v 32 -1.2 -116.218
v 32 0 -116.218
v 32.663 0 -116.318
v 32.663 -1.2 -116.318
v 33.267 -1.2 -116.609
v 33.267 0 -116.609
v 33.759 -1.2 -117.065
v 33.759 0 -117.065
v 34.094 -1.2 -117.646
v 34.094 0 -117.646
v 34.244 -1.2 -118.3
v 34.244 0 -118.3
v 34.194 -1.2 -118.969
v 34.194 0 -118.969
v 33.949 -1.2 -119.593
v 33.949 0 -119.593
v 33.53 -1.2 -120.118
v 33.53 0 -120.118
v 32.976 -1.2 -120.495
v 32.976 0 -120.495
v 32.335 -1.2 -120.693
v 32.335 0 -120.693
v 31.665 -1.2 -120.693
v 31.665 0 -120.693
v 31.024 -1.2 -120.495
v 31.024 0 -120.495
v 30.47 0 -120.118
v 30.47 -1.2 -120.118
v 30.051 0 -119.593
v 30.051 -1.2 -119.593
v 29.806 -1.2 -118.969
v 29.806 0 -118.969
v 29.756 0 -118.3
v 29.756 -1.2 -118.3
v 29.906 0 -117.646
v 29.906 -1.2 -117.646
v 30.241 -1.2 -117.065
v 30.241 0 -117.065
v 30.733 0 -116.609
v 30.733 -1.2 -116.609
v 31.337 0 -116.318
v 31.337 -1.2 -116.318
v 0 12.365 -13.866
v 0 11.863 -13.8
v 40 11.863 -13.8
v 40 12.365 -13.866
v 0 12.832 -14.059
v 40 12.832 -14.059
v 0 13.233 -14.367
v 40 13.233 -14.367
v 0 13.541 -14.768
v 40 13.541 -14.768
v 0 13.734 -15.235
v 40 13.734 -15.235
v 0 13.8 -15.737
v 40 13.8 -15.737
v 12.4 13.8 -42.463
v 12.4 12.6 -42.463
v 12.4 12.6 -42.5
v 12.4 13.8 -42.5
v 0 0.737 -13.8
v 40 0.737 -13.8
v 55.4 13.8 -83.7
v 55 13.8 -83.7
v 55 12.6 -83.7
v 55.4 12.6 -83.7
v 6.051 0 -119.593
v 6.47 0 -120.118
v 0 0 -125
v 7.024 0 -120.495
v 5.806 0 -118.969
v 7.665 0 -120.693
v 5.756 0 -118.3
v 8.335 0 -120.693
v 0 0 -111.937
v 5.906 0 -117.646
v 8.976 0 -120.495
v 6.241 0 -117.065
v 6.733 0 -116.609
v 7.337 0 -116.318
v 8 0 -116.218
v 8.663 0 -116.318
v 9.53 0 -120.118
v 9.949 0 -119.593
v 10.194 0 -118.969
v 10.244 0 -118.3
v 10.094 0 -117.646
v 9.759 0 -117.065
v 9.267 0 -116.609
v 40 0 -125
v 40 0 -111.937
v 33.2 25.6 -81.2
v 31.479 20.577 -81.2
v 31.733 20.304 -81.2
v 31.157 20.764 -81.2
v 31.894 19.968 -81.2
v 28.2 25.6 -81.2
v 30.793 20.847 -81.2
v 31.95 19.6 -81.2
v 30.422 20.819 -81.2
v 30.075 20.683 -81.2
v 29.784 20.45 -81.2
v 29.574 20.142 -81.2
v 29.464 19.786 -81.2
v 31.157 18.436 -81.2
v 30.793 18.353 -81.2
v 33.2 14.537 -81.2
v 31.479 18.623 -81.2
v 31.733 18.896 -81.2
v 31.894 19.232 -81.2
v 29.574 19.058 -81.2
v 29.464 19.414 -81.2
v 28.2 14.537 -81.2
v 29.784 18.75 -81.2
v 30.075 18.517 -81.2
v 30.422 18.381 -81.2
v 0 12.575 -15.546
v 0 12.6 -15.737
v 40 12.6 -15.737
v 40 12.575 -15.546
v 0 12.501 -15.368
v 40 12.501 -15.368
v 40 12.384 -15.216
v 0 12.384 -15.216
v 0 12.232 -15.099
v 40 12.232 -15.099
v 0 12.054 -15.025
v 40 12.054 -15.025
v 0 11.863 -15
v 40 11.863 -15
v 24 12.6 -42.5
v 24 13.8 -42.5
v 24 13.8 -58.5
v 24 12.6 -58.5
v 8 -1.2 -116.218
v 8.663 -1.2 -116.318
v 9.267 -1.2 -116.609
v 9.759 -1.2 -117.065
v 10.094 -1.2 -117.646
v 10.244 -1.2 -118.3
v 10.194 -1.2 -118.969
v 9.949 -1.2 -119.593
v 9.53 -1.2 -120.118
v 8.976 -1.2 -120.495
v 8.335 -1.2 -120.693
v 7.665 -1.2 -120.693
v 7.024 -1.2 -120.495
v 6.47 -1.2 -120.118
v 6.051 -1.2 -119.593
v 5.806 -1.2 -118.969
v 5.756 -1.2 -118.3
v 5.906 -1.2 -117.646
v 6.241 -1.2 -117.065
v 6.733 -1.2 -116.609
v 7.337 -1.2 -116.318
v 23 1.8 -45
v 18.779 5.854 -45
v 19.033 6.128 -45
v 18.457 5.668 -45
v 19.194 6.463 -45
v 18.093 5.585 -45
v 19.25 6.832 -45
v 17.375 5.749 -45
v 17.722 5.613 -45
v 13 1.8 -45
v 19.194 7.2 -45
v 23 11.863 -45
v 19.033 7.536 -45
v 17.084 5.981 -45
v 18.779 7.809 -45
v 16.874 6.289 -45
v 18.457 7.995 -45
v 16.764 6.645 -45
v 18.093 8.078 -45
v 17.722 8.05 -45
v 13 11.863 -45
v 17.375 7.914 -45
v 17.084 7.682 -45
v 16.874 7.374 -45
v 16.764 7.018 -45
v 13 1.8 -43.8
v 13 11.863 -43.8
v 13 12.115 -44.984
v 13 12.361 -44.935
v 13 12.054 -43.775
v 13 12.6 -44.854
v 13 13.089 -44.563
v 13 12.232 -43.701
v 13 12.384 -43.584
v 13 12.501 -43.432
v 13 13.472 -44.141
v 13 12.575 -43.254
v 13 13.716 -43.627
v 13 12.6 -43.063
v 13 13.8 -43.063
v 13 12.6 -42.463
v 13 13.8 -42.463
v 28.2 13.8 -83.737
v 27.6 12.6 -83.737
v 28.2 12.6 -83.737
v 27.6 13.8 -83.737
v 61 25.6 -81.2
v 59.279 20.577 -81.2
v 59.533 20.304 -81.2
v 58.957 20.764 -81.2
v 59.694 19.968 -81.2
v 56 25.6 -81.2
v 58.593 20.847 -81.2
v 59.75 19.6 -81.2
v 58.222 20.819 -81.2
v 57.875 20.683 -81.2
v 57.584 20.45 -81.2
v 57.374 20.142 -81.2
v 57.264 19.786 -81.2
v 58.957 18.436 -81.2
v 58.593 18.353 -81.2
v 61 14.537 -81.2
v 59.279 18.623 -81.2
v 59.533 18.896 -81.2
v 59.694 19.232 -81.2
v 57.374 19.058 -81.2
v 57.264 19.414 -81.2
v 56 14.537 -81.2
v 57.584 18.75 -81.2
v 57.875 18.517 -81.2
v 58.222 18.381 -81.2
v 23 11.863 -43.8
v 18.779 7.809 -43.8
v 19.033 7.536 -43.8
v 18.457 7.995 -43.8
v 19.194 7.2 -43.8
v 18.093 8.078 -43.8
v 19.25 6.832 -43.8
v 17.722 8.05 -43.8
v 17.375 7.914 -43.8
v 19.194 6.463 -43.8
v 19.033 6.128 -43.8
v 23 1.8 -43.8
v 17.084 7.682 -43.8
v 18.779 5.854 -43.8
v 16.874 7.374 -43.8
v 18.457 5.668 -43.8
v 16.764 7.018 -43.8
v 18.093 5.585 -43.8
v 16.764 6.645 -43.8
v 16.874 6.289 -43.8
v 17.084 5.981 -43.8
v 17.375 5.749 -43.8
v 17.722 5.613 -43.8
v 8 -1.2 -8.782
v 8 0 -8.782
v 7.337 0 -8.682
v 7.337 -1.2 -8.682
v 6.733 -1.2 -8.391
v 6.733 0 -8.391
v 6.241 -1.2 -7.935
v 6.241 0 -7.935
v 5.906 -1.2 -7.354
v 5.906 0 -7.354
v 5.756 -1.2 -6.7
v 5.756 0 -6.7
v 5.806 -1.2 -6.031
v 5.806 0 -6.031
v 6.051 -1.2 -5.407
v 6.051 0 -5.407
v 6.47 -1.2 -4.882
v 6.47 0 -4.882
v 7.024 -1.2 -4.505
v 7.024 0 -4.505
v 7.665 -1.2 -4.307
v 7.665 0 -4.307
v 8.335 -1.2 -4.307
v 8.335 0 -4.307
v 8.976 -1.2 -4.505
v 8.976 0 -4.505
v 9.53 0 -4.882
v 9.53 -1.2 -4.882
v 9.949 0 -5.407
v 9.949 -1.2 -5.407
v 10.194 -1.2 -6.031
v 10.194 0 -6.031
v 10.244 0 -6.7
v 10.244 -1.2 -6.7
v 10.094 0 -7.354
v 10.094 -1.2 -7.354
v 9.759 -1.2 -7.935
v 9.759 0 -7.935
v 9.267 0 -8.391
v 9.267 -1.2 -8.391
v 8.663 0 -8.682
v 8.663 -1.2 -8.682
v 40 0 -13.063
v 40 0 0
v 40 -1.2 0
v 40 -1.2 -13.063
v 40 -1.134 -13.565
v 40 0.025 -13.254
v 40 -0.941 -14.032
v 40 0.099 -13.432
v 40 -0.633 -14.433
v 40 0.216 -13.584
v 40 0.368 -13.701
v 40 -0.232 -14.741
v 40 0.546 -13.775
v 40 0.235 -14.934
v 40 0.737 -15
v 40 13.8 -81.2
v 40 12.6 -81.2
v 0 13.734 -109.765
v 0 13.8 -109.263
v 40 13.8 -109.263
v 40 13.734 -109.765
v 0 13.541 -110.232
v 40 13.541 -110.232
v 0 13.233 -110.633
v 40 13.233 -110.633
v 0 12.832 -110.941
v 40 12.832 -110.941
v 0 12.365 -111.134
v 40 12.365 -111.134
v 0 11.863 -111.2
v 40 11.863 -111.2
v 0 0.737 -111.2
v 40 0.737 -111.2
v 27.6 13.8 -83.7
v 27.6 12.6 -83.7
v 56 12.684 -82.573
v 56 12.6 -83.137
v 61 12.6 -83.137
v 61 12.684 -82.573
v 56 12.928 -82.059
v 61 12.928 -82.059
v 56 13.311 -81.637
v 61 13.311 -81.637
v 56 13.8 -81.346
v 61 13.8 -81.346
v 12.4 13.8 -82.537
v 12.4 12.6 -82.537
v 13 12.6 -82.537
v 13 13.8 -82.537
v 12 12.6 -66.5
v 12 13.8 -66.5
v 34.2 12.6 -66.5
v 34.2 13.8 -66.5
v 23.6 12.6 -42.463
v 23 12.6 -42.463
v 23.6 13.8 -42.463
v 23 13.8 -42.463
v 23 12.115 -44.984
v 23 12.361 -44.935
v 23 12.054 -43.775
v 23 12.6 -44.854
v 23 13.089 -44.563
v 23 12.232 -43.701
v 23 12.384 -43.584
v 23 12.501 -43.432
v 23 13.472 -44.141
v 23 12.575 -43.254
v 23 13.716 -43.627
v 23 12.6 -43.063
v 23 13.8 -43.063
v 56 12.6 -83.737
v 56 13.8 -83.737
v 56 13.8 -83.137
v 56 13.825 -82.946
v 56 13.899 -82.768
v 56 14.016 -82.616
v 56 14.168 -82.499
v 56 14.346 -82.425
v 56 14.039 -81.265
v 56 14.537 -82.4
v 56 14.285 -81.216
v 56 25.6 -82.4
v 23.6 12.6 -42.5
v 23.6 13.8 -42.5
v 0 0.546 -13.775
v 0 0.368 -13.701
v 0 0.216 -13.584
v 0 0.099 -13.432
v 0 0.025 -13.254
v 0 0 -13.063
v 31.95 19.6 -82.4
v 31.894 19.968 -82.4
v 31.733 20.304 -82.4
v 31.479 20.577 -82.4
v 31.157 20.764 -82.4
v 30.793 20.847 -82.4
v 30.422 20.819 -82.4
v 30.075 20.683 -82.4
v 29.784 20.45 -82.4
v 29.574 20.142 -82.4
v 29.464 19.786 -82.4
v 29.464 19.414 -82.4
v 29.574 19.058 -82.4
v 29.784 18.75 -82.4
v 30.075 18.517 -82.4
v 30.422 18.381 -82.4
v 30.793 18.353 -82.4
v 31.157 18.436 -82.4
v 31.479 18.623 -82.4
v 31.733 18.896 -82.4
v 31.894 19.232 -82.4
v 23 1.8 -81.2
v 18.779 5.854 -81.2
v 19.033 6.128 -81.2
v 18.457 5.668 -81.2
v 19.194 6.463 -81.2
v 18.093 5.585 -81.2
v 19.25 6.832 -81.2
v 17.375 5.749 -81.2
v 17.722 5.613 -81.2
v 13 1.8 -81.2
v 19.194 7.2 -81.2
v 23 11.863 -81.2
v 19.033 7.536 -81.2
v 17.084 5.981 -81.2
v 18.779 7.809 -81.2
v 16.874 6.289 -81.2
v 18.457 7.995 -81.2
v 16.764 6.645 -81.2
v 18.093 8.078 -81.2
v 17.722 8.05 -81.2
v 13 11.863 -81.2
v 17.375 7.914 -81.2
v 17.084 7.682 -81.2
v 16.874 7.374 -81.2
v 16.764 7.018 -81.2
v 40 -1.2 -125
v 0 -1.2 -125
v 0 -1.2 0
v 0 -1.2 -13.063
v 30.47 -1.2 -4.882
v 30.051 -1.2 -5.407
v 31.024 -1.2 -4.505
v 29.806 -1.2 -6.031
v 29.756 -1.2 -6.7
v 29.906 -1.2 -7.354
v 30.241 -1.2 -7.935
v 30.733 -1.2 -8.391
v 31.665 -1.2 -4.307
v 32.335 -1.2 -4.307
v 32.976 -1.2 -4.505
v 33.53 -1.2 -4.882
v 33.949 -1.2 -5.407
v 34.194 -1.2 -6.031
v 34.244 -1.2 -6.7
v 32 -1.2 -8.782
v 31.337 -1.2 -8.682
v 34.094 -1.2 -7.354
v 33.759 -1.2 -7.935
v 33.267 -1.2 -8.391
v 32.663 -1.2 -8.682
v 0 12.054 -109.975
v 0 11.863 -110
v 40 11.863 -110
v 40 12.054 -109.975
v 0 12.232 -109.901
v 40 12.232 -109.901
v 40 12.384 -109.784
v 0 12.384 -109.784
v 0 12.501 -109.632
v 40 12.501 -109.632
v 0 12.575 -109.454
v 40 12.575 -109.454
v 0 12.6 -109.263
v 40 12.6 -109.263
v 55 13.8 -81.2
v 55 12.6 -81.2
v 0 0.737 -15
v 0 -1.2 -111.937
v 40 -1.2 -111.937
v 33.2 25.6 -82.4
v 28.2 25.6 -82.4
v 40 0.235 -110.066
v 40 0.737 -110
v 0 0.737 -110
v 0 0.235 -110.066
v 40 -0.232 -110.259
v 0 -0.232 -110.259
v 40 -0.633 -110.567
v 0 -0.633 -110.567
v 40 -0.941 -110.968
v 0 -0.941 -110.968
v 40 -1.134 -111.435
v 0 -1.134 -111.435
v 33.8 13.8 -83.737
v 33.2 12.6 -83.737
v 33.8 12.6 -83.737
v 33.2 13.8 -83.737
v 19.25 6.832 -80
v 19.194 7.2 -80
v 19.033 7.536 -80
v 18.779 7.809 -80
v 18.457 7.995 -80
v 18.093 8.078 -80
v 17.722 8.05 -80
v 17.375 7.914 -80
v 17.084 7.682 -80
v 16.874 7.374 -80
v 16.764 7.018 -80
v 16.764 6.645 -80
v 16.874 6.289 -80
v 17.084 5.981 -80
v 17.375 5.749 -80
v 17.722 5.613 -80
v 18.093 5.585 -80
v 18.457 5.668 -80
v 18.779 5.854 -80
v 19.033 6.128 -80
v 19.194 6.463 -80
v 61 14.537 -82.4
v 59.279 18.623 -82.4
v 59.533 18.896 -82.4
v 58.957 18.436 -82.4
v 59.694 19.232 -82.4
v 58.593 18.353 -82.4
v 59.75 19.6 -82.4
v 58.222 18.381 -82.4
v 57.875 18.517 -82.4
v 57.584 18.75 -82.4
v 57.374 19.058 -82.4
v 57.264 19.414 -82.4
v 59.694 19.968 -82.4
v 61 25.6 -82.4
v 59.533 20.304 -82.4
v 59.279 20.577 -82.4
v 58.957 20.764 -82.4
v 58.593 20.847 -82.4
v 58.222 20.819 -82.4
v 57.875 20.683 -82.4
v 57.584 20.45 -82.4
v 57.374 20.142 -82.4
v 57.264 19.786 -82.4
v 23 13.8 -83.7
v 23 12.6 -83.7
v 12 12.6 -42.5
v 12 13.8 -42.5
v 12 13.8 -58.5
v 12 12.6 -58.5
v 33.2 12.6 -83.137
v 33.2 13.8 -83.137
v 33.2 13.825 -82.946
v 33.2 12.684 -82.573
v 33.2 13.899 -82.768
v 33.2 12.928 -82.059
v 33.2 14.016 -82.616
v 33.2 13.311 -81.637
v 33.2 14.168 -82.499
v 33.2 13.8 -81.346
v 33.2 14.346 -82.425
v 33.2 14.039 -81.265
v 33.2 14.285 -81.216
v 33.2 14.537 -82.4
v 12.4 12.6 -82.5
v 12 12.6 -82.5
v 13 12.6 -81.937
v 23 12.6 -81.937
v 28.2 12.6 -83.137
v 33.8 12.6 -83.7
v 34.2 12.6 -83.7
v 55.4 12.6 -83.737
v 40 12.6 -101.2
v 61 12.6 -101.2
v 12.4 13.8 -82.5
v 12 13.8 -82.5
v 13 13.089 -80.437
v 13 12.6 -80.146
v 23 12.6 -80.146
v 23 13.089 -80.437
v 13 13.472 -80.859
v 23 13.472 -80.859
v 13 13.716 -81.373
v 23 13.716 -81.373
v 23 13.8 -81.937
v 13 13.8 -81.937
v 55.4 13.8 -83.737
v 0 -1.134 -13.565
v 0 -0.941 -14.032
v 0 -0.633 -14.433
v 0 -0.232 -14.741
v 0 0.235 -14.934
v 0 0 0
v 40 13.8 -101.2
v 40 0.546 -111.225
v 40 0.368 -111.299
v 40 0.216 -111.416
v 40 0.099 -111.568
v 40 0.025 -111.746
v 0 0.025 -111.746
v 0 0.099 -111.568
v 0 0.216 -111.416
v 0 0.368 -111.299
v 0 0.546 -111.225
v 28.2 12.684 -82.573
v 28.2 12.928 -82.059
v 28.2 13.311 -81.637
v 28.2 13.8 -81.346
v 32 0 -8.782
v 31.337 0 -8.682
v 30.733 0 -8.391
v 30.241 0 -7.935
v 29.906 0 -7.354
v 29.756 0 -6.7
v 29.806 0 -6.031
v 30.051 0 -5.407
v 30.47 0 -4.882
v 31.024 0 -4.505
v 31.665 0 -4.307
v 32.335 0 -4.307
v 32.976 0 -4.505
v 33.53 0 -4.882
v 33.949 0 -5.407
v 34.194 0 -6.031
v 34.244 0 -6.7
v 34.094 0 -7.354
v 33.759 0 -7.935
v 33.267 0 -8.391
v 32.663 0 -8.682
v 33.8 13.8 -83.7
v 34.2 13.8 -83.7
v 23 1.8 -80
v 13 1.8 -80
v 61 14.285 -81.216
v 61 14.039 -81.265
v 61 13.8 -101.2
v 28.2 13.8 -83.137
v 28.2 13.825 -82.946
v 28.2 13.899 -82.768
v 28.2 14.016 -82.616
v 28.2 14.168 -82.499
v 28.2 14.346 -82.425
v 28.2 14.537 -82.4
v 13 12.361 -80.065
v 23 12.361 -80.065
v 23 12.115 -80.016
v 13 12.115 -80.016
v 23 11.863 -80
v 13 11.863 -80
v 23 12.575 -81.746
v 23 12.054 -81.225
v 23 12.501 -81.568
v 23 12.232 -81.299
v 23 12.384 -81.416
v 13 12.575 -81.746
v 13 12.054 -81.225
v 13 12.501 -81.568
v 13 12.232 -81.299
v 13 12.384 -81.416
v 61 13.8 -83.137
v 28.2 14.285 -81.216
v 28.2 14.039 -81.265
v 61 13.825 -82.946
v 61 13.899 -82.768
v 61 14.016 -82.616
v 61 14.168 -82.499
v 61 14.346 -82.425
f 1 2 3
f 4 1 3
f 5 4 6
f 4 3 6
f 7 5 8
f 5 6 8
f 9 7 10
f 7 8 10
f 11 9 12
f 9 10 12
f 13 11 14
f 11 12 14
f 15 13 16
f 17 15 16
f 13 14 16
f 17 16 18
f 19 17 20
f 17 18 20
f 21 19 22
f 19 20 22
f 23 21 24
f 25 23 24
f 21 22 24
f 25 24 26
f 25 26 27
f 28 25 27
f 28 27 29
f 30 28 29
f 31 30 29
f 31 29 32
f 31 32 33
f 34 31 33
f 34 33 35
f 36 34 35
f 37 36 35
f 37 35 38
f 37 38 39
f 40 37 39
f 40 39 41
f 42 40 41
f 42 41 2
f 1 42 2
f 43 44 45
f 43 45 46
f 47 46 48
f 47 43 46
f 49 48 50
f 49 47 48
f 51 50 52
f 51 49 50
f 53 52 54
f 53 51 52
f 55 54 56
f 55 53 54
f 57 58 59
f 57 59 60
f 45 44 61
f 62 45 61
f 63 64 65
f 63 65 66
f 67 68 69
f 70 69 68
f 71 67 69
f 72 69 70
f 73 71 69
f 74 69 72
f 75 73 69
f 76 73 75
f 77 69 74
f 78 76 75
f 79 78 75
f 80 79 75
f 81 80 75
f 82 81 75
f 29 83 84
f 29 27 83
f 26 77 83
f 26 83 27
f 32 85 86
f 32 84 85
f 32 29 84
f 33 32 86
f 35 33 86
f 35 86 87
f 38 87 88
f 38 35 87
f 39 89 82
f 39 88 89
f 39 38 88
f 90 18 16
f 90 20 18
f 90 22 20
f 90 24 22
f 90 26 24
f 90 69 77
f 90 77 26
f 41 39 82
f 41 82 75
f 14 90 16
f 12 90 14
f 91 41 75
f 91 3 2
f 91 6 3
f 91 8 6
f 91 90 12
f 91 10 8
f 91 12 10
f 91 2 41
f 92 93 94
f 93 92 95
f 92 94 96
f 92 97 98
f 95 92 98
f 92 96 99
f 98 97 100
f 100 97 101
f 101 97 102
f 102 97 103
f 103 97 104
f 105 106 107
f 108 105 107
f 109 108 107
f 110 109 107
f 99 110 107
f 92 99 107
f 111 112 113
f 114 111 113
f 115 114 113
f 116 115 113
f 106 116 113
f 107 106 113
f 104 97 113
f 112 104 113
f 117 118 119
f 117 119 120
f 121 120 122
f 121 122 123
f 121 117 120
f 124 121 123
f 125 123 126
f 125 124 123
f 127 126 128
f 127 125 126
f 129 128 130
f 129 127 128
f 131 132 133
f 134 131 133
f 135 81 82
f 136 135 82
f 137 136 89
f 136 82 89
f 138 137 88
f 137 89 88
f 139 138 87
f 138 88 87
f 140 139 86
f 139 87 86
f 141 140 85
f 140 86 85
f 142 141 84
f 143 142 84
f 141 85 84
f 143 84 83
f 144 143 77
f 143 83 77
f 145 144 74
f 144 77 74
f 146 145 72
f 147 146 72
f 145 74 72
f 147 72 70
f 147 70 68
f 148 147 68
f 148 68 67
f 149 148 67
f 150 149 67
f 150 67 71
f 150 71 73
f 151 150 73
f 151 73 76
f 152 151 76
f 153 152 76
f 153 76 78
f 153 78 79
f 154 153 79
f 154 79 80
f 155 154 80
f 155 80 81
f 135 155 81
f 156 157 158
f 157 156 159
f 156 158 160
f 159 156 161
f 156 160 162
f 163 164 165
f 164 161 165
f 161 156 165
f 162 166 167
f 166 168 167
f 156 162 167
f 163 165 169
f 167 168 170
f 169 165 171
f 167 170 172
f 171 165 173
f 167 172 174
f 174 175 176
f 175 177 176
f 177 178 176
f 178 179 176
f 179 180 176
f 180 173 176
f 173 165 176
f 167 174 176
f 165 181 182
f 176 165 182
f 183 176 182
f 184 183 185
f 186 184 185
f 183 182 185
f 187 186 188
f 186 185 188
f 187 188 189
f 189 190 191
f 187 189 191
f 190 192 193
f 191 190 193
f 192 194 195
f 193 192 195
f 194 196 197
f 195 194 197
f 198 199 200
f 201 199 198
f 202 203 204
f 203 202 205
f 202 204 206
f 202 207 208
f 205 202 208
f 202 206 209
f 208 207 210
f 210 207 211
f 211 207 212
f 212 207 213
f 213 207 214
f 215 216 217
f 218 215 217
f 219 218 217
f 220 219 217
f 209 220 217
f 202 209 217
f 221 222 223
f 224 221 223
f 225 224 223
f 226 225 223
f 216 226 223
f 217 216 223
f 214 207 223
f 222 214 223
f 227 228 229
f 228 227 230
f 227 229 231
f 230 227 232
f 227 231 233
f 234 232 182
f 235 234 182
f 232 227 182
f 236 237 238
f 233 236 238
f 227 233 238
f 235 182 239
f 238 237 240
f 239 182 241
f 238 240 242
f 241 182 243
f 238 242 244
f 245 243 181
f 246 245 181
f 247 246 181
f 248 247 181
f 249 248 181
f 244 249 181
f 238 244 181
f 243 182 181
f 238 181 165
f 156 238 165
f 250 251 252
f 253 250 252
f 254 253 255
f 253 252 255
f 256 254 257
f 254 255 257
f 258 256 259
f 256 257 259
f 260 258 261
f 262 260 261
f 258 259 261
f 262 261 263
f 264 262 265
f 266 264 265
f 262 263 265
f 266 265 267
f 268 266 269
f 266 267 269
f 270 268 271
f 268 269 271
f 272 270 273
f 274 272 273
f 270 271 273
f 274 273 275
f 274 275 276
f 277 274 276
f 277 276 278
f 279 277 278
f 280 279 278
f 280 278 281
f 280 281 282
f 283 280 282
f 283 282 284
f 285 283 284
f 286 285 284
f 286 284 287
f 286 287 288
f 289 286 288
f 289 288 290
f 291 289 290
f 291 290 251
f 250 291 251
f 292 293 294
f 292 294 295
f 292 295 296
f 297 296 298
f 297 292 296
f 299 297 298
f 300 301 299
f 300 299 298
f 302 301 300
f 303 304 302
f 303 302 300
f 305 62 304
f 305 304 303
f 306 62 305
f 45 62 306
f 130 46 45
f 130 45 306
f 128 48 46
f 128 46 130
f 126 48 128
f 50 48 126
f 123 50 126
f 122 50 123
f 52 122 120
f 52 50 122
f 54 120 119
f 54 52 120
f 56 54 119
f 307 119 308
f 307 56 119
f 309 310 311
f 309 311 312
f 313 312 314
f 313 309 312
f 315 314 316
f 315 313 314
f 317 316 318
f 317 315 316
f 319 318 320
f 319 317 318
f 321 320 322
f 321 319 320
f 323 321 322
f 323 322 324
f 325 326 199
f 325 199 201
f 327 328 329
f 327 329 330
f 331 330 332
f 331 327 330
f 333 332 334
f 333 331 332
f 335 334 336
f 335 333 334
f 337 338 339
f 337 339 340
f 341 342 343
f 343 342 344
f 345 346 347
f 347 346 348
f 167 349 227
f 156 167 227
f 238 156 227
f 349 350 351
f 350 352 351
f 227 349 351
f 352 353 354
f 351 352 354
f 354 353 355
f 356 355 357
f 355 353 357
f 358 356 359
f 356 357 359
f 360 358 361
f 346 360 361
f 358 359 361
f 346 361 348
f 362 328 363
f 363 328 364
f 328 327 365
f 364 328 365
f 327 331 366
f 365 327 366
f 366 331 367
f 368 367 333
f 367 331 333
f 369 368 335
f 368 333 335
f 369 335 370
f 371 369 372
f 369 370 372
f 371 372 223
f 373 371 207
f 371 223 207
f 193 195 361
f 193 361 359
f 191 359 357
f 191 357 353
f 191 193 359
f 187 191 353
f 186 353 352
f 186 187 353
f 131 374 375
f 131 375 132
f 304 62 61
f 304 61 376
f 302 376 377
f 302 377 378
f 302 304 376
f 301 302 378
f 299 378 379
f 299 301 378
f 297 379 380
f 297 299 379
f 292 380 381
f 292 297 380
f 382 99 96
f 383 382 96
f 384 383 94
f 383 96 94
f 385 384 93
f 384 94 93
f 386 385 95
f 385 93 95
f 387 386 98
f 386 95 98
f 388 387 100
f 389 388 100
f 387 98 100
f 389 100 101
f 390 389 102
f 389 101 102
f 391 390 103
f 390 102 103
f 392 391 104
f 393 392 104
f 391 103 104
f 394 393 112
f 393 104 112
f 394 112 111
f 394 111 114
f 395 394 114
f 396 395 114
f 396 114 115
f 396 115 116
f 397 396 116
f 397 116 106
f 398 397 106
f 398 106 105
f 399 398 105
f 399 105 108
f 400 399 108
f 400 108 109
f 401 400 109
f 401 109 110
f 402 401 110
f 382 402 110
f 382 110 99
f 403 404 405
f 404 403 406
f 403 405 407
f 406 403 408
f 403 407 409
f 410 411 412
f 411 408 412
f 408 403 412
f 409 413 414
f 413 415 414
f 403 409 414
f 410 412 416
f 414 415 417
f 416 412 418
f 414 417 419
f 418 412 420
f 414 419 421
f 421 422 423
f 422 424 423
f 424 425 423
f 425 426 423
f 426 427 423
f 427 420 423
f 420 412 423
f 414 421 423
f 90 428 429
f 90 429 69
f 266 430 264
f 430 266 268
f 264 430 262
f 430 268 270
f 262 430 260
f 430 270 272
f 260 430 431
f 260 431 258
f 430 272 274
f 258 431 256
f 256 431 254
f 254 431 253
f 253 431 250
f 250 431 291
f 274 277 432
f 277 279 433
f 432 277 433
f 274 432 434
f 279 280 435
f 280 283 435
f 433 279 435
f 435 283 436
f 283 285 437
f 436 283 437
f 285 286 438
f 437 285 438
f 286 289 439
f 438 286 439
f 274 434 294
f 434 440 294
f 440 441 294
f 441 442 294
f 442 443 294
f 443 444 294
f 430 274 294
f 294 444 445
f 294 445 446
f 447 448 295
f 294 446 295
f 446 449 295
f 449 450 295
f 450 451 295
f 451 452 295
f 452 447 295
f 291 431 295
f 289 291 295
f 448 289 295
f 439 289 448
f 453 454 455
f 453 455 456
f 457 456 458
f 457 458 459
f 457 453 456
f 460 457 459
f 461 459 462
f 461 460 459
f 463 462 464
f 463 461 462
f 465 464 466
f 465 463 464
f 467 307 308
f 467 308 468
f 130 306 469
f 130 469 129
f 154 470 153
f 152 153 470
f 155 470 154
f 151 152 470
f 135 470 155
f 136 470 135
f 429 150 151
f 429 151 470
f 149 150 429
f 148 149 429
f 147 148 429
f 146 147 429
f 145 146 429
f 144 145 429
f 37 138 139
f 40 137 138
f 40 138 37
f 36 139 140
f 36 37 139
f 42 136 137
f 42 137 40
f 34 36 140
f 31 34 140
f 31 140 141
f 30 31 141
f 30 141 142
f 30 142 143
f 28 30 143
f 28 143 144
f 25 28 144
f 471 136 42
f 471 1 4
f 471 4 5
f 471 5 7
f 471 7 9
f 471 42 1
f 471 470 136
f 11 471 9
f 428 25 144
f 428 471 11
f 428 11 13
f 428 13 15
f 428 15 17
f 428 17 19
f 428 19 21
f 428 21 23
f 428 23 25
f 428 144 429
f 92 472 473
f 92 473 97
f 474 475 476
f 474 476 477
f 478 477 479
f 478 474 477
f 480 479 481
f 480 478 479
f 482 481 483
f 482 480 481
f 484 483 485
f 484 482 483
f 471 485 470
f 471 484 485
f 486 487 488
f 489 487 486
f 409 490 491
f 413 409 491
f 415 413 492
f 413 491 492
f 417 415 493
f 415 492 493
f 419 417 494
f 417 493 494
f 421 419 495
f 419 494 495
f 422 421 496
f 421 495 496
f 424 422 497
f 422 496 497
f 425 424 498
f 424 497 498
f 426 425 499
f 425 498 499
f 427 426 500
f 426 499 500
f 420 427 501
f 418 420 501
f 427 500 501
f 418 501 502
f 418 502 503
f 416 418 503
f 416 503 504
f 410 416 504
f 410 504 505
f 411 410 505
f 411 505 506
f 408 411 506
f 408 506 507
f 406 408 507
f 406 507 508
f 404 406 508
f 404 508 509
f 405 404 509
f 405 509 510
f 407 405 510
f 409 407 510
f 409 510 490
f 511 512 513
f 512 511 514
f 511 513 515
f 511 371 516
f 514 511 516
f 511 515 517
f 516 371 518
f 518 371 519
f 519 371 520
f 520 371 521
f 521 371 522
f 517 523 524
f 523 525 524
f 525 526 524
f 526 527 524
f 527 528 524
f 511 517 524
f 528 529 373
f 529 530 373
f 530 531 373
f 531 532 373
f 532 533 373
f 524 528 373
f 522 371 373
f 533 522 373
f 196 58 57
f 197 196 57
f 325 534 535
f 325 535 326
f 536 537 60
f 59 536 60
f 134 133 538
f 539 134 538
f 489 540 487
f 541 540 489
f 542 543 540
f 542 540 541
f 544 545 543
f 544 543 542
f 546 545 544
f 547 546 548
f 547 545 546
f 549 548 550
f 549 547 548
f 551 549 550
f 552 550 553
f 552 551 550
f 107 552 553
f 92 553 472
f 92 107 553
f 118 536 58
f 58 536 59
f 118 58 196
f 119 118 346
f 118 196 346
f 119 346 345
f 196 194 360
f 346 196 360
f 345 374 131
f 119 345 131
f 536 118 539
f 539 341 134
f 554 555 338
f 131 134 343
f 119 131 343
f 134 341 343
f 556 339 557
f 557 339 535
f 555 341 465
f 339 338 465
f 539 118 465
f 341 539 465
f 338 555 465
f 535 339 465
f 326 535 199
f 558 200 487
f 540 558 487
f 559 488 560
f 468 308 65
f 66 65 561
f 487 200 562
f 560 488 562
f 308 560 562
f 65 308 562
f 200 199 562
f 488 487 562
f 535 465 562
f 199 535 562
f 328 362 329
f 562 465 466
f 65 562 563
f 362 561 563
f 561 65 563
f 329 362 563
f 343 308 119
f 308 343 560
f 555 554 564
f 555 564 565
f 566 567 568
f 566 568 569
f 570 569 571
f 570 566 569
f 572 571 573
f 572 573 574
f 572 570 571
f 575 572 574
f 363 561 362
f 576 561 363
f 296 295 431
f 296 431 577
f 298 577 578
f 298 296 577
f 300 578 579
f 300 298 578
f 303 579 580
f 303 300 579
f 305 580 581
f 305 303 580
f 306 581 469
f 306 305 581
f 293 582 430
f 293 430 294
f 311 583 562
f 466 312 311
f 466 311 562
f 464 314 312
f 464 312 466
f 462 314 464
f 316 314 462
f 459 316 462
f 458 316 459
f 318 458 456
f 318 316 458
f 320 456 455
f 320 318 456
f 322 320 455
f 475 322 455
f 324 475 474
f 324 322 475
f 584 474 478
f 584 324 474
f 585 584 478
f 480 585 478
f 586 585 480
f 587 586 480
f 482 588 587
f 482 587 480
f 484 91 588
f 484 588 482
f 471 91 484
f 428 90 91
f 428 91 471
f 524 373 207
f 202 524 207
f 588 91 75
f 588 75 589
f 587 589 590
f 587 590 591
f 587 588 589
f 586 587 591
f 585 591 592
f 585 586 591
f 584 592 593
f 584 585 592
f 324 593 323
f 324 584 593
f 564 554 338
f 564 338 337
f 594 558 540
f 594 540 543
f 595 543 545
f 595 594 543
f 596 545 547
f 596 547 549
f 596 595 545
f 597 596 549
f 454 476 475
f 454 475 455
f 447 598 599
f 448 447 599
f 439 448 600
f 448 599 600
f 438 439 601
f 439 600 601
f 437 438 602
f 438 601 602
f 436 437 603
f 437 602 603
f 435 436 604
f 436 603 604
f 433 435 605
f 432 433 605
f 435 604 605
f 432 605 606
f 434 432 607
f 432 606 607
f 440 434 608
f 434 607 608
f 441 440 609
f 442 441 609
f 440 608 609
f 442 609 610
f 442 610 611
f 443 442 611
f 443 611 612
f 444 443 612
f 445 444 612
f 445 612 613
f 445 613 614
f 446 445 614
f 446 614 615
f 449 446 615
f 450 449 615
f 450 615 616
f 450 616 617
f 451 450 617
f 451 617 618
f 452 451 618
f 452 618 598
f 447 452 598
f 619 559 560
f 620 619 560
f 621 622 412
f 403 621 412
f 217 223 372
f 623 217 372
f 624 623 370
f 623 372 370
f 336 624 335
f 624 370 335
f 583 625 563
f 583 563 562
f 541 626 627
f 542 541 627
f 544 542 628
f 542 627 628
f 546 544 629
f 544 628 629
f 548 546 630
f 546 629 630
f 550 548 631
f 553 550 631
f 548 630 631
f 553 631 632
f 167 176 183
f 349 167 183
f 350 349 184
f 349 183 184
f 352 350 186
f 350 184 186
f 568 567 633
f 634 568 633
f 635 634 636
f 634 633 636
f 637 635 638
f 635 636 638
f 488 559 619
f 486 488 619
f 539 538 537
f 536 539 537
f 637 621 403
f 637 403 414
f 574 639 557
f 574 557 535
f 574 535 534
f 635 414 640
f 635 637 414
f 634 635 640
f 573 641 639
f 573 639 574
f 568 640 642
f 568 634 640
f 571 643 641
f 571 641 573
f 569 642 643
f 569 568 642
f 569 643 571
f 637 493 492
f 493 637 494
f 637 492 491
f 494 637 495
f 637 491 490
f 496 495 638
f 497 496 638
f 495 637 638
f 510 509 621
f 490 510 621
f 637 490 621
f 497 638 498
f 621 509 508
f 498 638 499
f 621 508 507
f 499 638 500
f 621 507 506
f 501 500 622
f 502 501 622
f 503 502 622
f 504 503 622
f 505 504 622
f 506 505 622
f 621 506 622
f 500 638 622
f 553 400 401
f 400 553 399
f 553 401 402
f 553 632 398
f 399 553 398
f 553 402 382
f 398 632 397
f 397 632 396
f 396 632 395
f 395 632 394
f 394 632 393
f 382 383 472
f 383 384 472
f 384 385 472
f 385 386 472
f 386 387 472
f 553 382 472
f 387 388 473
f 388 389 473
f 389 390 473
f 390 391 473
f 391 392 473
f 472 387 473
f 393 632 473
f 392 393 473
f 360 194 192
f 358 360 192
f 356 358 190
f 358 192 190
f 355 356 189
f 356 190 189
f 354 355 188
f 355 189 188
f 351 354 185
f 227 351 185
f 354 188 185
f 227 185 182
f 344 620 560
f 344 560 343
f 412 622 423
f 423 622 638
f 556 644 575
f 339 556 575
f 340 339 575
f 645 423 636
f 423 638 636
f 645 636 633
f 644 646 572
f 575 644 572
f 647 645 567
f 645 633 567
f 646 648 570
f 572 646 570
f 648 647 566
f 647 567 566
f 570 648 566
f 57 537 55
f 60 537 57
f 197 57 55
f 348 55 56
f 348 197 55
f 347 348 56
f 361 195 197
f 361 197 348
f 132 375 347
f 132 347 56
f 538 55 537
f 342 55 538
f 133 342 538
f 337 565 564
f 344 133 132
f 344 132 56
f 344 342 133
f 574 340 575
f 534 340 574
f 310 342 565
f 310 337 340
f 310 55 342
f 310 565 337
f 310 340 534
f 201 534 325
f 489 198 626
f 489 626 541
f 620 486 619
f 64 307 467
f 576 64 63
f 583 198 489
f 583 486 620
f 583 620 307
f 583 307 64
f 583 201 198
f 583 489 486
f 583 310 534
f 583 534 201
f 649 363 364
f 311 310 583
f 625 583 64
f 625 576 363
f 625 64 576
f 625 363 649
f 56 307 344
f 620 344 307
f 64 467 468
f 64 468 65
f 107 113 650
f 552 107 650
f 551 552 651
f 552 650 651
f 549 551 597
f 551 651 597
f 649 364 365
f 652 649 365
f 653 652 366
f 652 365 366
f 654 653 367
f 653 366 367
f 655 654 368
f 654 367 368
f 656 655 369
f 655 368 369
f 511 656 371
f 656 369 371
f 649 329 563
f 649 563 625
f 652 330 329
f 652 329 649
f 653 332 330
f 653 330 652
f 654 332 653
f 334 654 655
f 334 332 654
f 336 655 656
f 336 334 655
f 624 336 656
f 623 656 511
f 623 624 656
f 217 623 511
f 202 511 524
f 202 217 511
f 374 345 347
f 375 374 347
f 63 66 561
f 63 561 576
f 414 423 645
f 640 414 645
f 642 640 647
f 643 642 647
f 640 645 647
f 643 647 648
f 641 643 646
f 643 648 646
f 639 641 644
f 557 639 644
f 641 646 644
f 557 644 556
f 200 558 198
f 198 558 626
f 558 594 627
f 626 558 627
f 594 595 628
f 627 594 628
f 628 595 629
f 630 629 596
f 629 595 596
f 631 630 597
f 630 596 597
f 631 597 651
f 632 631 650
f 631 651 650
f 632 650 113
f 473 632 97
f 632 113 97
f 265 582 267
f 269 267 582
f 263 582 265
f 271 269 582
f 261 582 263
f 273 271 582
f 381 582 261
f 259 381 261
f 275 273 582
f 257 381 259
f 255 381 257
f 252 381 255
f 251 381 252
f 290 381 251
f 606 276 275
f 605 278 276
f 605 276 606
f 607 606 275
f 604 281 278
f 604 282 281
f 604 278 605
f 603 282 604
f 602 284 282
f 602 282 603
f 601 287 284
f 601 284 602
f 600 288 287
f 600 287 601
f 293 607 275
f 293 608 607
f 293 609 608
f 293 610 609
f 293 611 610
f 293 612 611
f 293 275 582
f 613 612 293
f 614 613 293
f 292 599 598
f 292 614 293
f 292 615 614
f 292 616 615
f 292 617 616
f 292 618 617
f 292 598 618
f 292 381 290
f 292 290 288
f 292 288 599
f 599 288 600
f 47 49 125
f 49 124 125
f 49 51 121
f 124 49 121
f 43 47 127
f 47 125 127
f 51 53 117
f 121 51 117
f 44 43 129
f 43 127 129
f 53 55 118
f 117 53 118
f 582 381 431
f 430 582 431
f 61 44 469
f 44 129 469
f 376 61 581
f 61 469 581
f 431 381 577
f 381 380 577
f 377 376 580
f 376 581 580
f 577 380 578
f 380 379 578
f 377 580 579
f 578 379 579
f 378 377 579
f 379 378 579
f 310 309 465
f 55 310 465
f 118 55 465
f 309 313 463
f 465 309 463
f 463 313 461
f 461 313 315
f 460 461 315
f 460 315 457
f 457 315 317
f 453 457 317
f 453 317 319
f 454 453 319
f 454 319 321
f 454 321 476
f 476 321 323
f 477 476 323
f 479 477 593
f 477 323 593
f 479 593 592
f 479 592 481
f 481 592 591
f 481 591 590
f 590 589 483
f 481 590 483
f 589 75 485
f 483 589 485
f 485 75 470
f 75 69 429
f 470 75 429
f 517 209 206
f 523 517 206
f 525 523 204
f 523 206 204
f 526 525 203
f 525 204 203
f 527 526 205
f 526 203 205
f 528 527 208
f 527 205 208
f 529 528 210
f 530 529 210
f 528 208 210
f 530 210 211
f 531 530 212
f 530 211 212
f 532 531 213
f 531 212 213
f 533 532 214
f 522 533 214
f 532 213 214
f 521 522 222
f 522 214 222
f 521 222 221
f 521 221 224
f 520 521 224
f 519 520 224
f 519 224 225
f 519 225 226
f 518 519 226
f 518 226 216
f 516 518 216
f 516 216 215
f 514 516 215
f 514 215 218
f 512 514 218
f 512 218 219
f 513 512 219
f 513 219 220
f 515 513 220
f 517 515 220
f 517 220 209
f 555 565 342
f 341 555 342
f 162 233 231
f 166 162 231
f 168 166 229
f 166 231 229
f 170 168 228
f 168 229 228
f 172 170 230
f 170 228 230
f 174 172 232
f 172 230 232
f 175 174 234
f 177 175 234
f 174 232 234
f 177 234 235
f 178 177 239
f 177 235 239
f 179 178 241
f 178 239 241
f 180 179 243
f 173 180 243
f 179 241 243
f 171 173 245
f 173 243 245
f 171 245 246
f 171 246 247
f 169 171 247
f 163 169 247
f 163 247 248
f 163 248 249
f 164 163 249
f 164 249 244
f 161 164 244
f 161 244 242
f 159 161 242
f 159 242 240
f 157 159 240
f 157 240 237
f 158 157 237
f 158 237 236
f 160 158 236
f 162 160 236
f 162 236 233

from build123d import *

# Parameters (mm, degrees)
SKETCH_1_W                       = 40
SKETCH_1_H                       = 15
SM_BASE_FLANGE_1_DEPTH           = 1.2
SM_EDGE_FLANGE_1_STRIP_W         = 6.2732
SM_EDGE_FLANGE_1_STRIP_H         = 1.2
SM_EDGE_FLANGE_1_STRIP_CUT_DEPTH = 40
SM_EDGE_FLANGE_1_DEPTH           = 40
SM_EDGE_FLANGE_2_STRIP_W         = 6.2732
SM_EDGE_FLANGE_2_STRIP_H         = 1.2
SM_EDGE_FLANGE_2_STRIP_CUT_DEPTH = 40
SM_EDGE_FLANGE_2_DEPTH           = 40
SM_EDGE_FLANGE_2_FLAT_DEPTH      = 1.2
SM_EDGE_FLANGE_3_STRIP_W         = 6.2732
SM_EDGE_FLANGE_3_STRIP_H         = 1.2
SM_EDGE_FLANGE_3_STRIP_CUT_DEPTH = 40
SM_EDGE_FLANGE_3_DEPTH           = 40
SM_EDGE_FLANGE_4_STRIP_W         = 6.2732
SM_EDGE_FLANGE_4_STRIP_H         = 1.2
SM_EDGE_FLANGE_4_STRIP_CUT_DEPTH = 40
SM_EDGE_FLANGE_4_DEPTH           = 40
CUT_EXTRUDE_1_DEPTH              = 10
SM_START                         = 13
SM_EDGE_FLANGE_5_DEPTH           = 10
SM_START_2                       = 12.4
SM_EDGE_FLANGE_5_2_OUTLINE_W     = 1.2
SM_EDGE_FLANGE_5_2_OUTLINE_H     = 0.0366
SM_EDGE_FLANGE_5_2_DEPTH         = 0.6
SM_START_3                       = 23
SM_EDGE_FLANGE_5_3_OUTLINE_W     = 1.2
SM_EDGE_FLANGE_5_3_OUTLINE_H     = 0.0366
SM_EDGE_FLANGE_5_3_DEPTH         = 0.6
SM_EDGE_FLANGE_5_4_DEPTH         = 10
SKETCH_26_R                      = 1.25
CUT_EXTRUDE_2_DEPTH              = 46
CUT_EXTRUDE_3_REACH              = 141.896
SKETCH_28_W                      = 1
SKETCH_28_H                      = 2.5
SM_START_4                       = 28.2
SM_EDGE_FLANGE_6_DEPTH           = 5
SM_START_5                       = 56
SM_EDGE_FLANGE_6_2_DEPTH         = 5
SM_START_6                       = 27.6
SM_EDGE_FLANGE_6_3_OUTLINE_W     = 1.2
SM_EDGE_FLANGE_6_3_OUTLINE_H     = 0.0366
SM_EDGE_FLANGE_6_3_DEPTH         = 0.6
SM_START_7                       = 33.2
SM_EDGE_FLANGE_6_4_OUTLINE_W     = 1.2
SM_EDGE_FLANGE_6_4_OUTLINE_H     = 0.0366
SM_EDGE_FLANGE_6_4_DEPTH         = 0.6
SM_START_8                       = 55.4
SM_EDGE_FLANGE_6_5_OUTLINE_W     = 1.2
SM_EDGE_FLANGE_6_5_OUTLINE_H     = 0.0366
SM_EDGE_FLANGE_6_5_DEPTH         = 0.6
SM_EDGE_FLANGE_6_6_DEPTH         = 5
SM_EDGE_FLANGE_6_7_DEPTH         = 5
CUT_EXTRUDE_4_REACH              = 106.737
SKETCH_35_R                      = 1.25
CUT_EXTRUDE_5_REACH              = 141.896
SKETCH_36_R                      = 2.25


# Read off the part's stored shape, not the designer's step: Ребро-кромка5, Ребро-кромка6
# Sheet-metal steps are written as plain solids
with BuildPart() as part:
    # Sketch 1 → Базовая кромка1 (new body)
    with BuildSketch(Plane(origin=(0, 0, 0), x_dir=(1, 0, 0), z_dir=(0, 1, 0))):
        with Locations((20, 7.5)):
            Rectangle(SKETCH_1_W, SKETCH_1_H)
    extrude(amount=-SM_BASE_FLANGE_1_DEPTH)

    # Ребро-кромка1 strip (across the edge) → Ребро-кромка1 strip cut (cut)
    with BuildSketch(Plane(origin=(40, 0, -15), x_dir=(0, 0, 1), z_dir=(-1, 0, 0))):
        with Locations((-1.2, -0.6)):
            Rectangle(SM_EDGE_FLANGE_1_STRIP_W, SM_EDGE_FLANGE_1_STRIP_H)
    extrude(amount=SM_EDGE_FLANGE_1_STRIP_CUT_DEPTH, mode=Mode.SUBTRACT)

    # Ребро-кромка1 section (across the edge) → Ребро-кромка1 (add)
    with BuildSketch(Plane(origin=(40, 0, -15), x_dir=(0, 0, 1), z_dir=(-1, 0, 0))):
        with BuildLine():
            Line((0, 0.7366), (0, 13.8))
            Line((0, 13.8), (1.2, 13.8))
            Line((1.2, 13.8), (1.2, 0.7366))
            ThreePointArc((1.2, 0.7366), (1.415745145, 0.215745145), (1.9366, 0))
            Line((1.9366, 0), (1.9366, -1.2))
            ThreePointArc((1.9366, -1.2), (0.567217008, -0.632782992), (0, 0.7366))
        make_face()
    extrude(amount=SM_EDGE_FLANGE_1_DEPTH)

    # Ребро-кромка2 strip (across the edge) → Ребро-кромка2 strip cut (cut)
    with BuildSketch(Plane(origin=(0, 13.8, -15), x_dir=(0, -1, 0), z_dir=(1, 0, 0))):
        with Locations((-1.2, -0.6)):
            Rectangle(SM_EDGE_FLANGE_2_STRIP_W, SM_EDGE_FLANGE_2_STRIP_H)
    extrude(amount=SM_EDGE_FLANGE_2_STRIP_CUT_DEPTH, mode=Mode.SUBTRACT)

    # Ребро-кромка2 bend section (across the edge) → Ребро-кромка2 (add)
    with BuildSketch(Plane(origin=(0, 13.8, -15), x_dir=(0, -1, 0), z_dir=(1, 0, 0))):
        with BuildLine():
            Line((0, 0.7366), (1.2, 0.7366))
            ThreePointArc((1.2, 0.7366), (1.415745145, 0.215745145), (1.9366, 0))
            Line((1.9366, 0), (1.9366, -1.2))
            ThreePointArc((1.9366, -1.2), (0.567217008, -0.632782992), (0, 0.7366))
        make_face()
    extrude(amount=SM_EDGE_FLANGE_2_DEPTH)

    # Ребро-кромка2 profile (on flange) → Ребро-кромка2 flat (add)
    with BuildSketch(Plane(origin=(0, 13.8, -15), x_dir=(1, 0, 0), z_dir=(0, 1, 0))):
        Polygon((0, 0.7366), (40, 0.7366), (40, 66.2), (61, 66.2), (61, 86.2), (40, 86.2), (40, 96.2), (0, 96.2), align=None)
    extrude(amount=-SM_EDGE_FLANGE_2_FLAT_DEPTH)

    # Ребро-кромка3 strip (across the edge) → Ребро-кромка3 strip cut (cut)
    with BuildSketch(Plane(origin=(0, 12.6, -111.2), x_dir=(0, 0, 1), z_dir=(1, 0, 0))):
        with Locations((-1.2, -0.6)):
            Rectangle(SM_EDGE_FLANGE_3_STRIP_W, SM_EDGE_FLANGE_3_STRIP_H)
    extrude(amount=SM_EDGE_FLANGE_3_STRIP_CUT_DEPTH, mode=Mode.SUBTRACT)

    # Ребро-кромка3 section (across the edge) → Ребро-кромка3 (add)
    with BuildSketch(Plane(origin=(0, 12.6, -111.2), x_dir=(0, 0, 1), z_dir=(1, 0, 0))):
        with BuildLine():
            Line((0, 0.7366), (0, 13.8))
            Line((0, 13.8), (1.2, 13.8))
            Line((1.2, 13.8), (1.2, 0.7366))
            ThreePointArc((1.2, 0.7366), (1.415745145, 0.215745145), (1.9366, 0))
            Line((1.9366, 0), (1.9366, -1.2))
            ThreePointArc((1.9366, -1.2), (0.567217008, -0.632782992), (0, 0.7366))
        make_face()
    extrude(amount=SM_EDGE_FLANGE_3_DEPTH)

    # Ребро-кромка4 strip (across the edge) → Ребро-кромка4 strip cut (cut)
    with BuildSketch(Plane(origin=(40, -1.2, -111.2), x_dir=(0, 1, 0), z_dir=(-1, 0, 0))):
        with Locations((-1.2, -0.6)):
            Rectangle(SM_EDGE_FLANGE_4_STRIP_W, SM_EDGE_FLANGE_4_STRIP_H)
    extrude(amount=SM_EDGE_FLANGE_4_STRIP_CUT_DEPTH, mode=Mode.SUBTRACT)

    # Ребро-кромка4 section (across the edge) → Ребро-кромка4 (add)
    with BuildSketch(Plane(origin=(40, -1.2, -111.2), x_dir=(0, 1, 0), z_dir=(-1, 0, 0))):
        with BuildLine():
            Line((0, 0.7366), (0, 13.8))
            Line((0, 13.8), (1.2, 13.8))
            Line((1.2, 13.8), (1.2, 0.7366))
            ThreePointArc((1.2, 0.7366), (1.415745145, 0.215745145), (1.9366, 0))
            Line((1.9366, 0), (1.9366, -1.2))
            ThreePointArc((1.9366, -1.2), (0.567217008, -0.632782992), (0, 0.7366))
        make_face()
    extrude(amount=SM_EDGE_FLANGE_4_DEPTH)

    # Эскиз19 → Вырез-Вытянуть1 (cut)
    with BuildSketch(Plane(origin=(0, 13.8, 0), x_dir=(1, 0, 0), z_dir=(0, 1, 0))):
        Polygon((13, 45), (23, 45), (23, 42.5), (24, 42.5), (24, 58.5), (12, 58.5), (12, 42.5), (13, 42.5), align=None)
        Polygon((12, 66.5), (24, 66.5), (24, 82.5), (23, 82.5), (23, 80), (13, 80), (13, 82.5), (12, 82.5), align=None)
    extrude(amount=-CUT_EXTRUDE_1_DEPTH, mode=Mode.SUBTRACT)

    # Ребро-кромка5 outline → Ребро-кромка5 (cut)
    with BuildSketch(Plane.YZ.offset(SM_START)):
        with BuildLine():
            ThreePointArc((12.6, -80.145555612), (13.472269031, -80.858657516), (13.8, -81.9366))
            Line((13.8, -81.9366), (13.8, -80))
            Line((13.8, -80), (12.6, -80))
            Line((12.6, -80), (12.6, -80.145555612))
        make_face()
        with BuildLine():
            Line((12.6, -45), (13.8, -45))
            Line((13.8, -45), (13.8, -43.0634))
            ThreePointArc((13.8, -43.0634), (13.472269031, -44.141342484), (12.6, -44.854444388))
            Line((12.6, -44.854444388), (12.6, -45))
        make_face()
    extrude(amount=SM_EDGE_FLANGE_5_DEPTH, mode=Mode.SUBTRACT)

    # Sm Edge Flange 5 2 outline → Sm Edge Flange 5 2 (cut)
    with BuildSketch(Plane.YZ.offset(SM_START_2)):
        with Locations((13.2, -82.5183)):
            Rectangle(SM_EDGE_FLANGE_5_2_OUTLINE_W, SM_EDGE_FLANGE_5_2_OUTLINE_H)
        with Locations((13.2, -42.4817)):
            Rectangle(SM_EDGE_FLANGE_5_2_OUTLINE_W, SM_EDGE_FLANGE_5_2_OUTLINE_H)
    extrude(amount=SM_EDGE_FLANGE_5_2_DEPTH, mode=Mode.SUBTRACT)

    # Sm Edge Flange 5 3 outline → Sm Edge Flange 5 3 (cut)
    with BuildSketch(Plane.YZ.offset(SM_START_3)):
        with Locations((13.2, -82.5183)):
            Rectangle(SM_EDGE_FLANGE_5_3_OUTLINE_W, SM_EDGE_FLANGE_5_3_OUTLINE_H)
        with Locations((13.2, -42.4817)):
            Rectangle(SM_EDGE_FLANGE_5_3_OUTLINE_W, SM_EDGE_FLANGE_5_3_OUTLINE_H)
    extrude(amount=SM_EDGE_FLANGE_5_3_DEPTH, mode=Mode.SUBTRACT)

    # Sm Edge Flange 5 4 outline → Sm Edge Flange 5 4 (add)
    with BuildSketch(Plane.YZ.offset(SM_START)):
        with BuildLine():
            ThreePointArc((11.8634, -81.2), (12.384254855, -81.415745145), (12.6, -81.9366))
            Line((12.6, -81.9366), (12.6, -80.145555612))
            ThreePointArc((12.6, -80.145555612), (12.238821762, -80.036737358), (11.8634, -80))
            Line((11.8634, -80), (1.8, -80))
            Line((1.8, -80), (1.8, -81.2))
            Line((1.8, -81.2), (11.8634, -81.2))
        make_face()
        with BuildLine():
            ThreePointArc((11.8634, -45), (12.238821762, -44.963262642), (12.6, -44.854444388))
            Line((12.6, -44.854444388), (12.6, -43.0634))
            ThreePointArc((12.6, -43.0634), (12.384254855, -43.584254855), (11.8634, -43.8))
            Line((11.8634, -43.8), (1.8, -43.8))
            Line((1.8, -43.8), (1.8, -45))
            Line((1.8, -45), (11.8634, -45))
        make_face()
    extrude(amount=SM_EDGE_FLANGE_5_4_DEPTH)

    # Эскиз26 → Вырез-Вытянуть2 (cut)
    with BuildSketch(Plane.XY.offset(-43.8)):
        with Locations((18, 6.8317)):
            Circle(SKETCH_26_R)
    extrude(amount=-CUT_EXTRUDE_2_DEPTH, mode=Mode.SUBTRACT)

    # Эскиз28 → Вырез-Вытянуть3 (cut, up to next)
    with BuildSketch(Plane(origin=(0, 13.8, 0), x_dir=(1, 0, 0), z_dir=(0, 1, 0)), mode=Mode.PRIVATE) as cut_extrude_3_sk1:
        with Locations((55.5, 82.45)):
            Rectangle(SKETCH_28_W, SKETCH_28_H)
    cut_extrude_3_tool1 = extrude(cut_extrude_3_sk1.sketch, amount=-CUT_EXTRUDE_3_REACH, mode=Mode.PRIVATE) & part.part
    # Эскиз28 → Вырез-Вытянуть3 (cut, up to next)
    with BuildSketch(Plane(origin=(0, 13.8, 0), x_dir=(1, 0, 0), z_dir=(0, 1, 0)), mode=Mode.PRIVATE) as cut_extrude_3_sk2:
        Polygon((28.2, 81.2), (33.2, 81.2), (33.2, 83.7), (34.2, 83.7), (34.2, 66.5), (23, 66.5), (23, 83.7), (28.2, 83.7), align=None)
    cut_extrude_3_tool2 = extrude(cut_extrude_3_sk2.sketch, amount=-CUT_EXTRUDE_3_REACH, mode=Mode.PRIVATE) & part.part
    add(cut_extrude_3_tool1.solids().sort_by_distance((55.5, 13.8, -82.45))[0], mode=Mode.SUBTRACT)
    add(cut_extrude_3_tool2.solids().sort_by_distance((28.45428, 13.8, -74.58998))[0], mode=Mode.SUBTRACT)

    # Ребро-кромка6 outline → Ребро-кромка6 (cut)
    with BuildSketch(Plane.YZ.offset(SM_START_4)):
        with BuildLine():
            ThreePointArc((12.6, -83.1366), (12.927730969, -82.058657516), (13.8, -81.345555612))
            Line((13.8, -81.345555612), (13.8, -81.2))
            Line((13.8, -81.2), (12.6, -81.2))
            Line((12.6, -81.2), (12.6, -83.1366))
        make_face()
    extrude(amount=SM_EDGE_FLANGE_6_DEPTH, mode=Mode.SUBTRACT)

    # Sm Edge Flange 6 2 outline → Sm Edge Flange 6 2 (cut)
    with BuildSketch(Plane.YZ.offset(SM_START_5)):
        with BuildLine():
            ThreePointArc((12.6, -83.1366), (12.927730969, -82.058657516), (13.8, -81.345555612))
            Line((13.8, -81.345555612), (13.8, -81.2))
            Line((13.8, -81.2), (12.6, -81.2))
            Line((12.6, -81.2), (12.6, -83.1366))
        make_face()
    extrude(amount=SM_EDGE_FLANGE_6_2_DEPTH, mode=Mode.SUBTRACT)

    # Sm Edge Flange 6 3 outline → Sm Edge Flange 6 3 (cut)
    with BuildSketch(Plane.YZ.offset(SM_START_6)):
        with Locations((13.2, -83.7183)):
            Rectangle(SM_EDGE_FLANGE_6_3_OUTLINE_W, SM_EDGE_FLANGE_6_3_OUTLINE_H)
    extrude(amount=SM_EDGE_FLANGE_6_3_DEPTH, mode=Mode.SUBTRACT)

    # Sm Edge Flange 6 4 outline → Sm Edge Flange 6 4 (cut)
    with BuildSketch(Plane.YZ.offset(SM_START_7)):
        with Locations((13.2, -83.7183)):
            Rectangle(SM_EDGE_FLANGE_6_4_OUTLINE_W, SM_EDGE_FLANGE_6_4_OUTLINE_H)
    extrude(amount=SM_EDGE_FLANGE_6_4_DEPTH, mode=Mode.SUBTRACT)

    # Sm Edge Flange 6 5 outline → Sm Edge Flange 6 5 (cut)
    with BuildSketch(Plane.YZ.offset(SM_START_8)):
        with Locations((13.2, -83.7183)):
            Rectangle(SM_EDGE_FLANGE_6_5_OUTLINE_W, SM_EDGE_FLANGE_6_5_OUTLINE_H)
    extrude(amount=SM_EDGE_FLANGE_6_5_DEPTH, mode=Mode.SUBTRACT)

    # Sm Edge Flange 6 6 outline → Sm Edge Flange 6 6 (add)
    with BuildSketch(Plane.YZ.offset(SM_START_4)):
        with BuildLine():
            Line((25.6, -81.2), (14.5366, -81.2))
            ThreePointArc((14.5366, -81.2), (14.161178238, -81.236737358), (13.8, -81.345555612))
            Line((13.8, -81.345555612), (13.8, -83.1366))
            ThreePointArc((13.8, -83.1366), (14.015745145, -82.615745145), (14.5366, -82.4))
            Line((14.5366, -82.4), (25.6, -82.4))
            Line((25.6, -82.4), (25.6, -81.2))
        make_face()
    extrude(amount=SM_EDGE_FLANGE_6_6_DEPTH)

    # Sm Edge Flange 6 7 outline → Sm Edge Flange 6 7 (add)
    with BuildSketch(Plane.YZ.offset(SM_START_5)):
        with BuildLine():
            Line((25.6, -81.2), (14.5366, -81.2))
            ThreePointArc((14.5366, -81.2), (14.161178238, -81.236737358), (13.8, -81.345555612))
            Line((13.8, -81.345555612), (13.8, -83.1366))
            ThreePointArc((13.8, -83.1366), (14.015745145, -82.615745145), (14.5366, -82.4))
            Line((14.5366, -82.4), (25.6, -82.4))
            Line((25.6, -82.4), (25.6, -81.2))
        make_face()
    extrude(amount=SM_EDGE_FLANGE_6_7_DEPTH)

    # Эскиз35 → Вырез-Вытянуть4 (cut, up to next)
    with BuildSketch(Plane.XY.offset(-81.2), mode=Mode.PRIVATE) as cut_extrude_4_sk1:
        with Locations((30.7, 19.6)):
            Circle(SKETCH_35_R)
    cut_extrude_4_tool1 = extrude(cut_extrude_4_sk1.sketch, amount=-CUT_EXTRUDE_4_REACH, mode=Mode.PRIVATE) & part.part
    # Эскиз35 → Вырез-Вытянуть4 (cut, up to next)
    with BuildSketch(Plane.XY.offset(-81.2), mode=Mode.PRIVATE) as cut_extrude_4_sk2:
        with Locations((58.5, 19.6)):
            Circle(SKETCH_35_R)
    cut_extrude_4_tool2 = extrude(cut_extrude_4_sk2.sketch, amount=-CUT_EXTRUDE_4_REACH, mode=Mode.PRIVATE) & part.part
    add(cut_extrude_4_tool1.solids().sort_by_distance((30.7, 19.6, -81.2))[0], mode=Mode.SUBTRACT)
    add(cut_extrude_4_tool2.solids().sort_by_distance((58.5, 19.6, -81.2))[0], mode=Mode.SUBTRACT)

    # Эскиз36 → Вырез-Вытянуть5 (cut, up to next)
    with BuildSketch(Plane(origin=(0, 13.8, 0), x_dir=(1, 0, 0), z_dir=(0, 1, 0)), mode=Mode.PRIVATE) as cut_extrude_5_sk1:
        with Locations(Location((8, 118.4683, 0), (0, 0, 270))):
            Circle(SKETCH_36_R)
    cut_extrude_5_tool1 = extrude(cut_extrude_5_sk1.sketch, amount=-CUT_EXTRUDE_5_REACH, mode=Mode.PRIVATE) & part.part
    # Эскиз36 → Вырез-Вытянуть5 (cut, up to next)
    with BuildSketch(Plane(origin=(0, 13.8, 0), x_dir=(1, 0, 0), z_dir=(0, 1, 0)), mode=Mode.PRIVATE) as cut_extrude_5_sk2:
        with Locations(Location((32, 118.4683, 0), (0, 0, 270))):
            Circle(SKETCH_36_R)
    cut_extrude_5_tool2 = extrude(cut_extrude_5_sk2.sketch, amount=-CUT_EXTRUDE_5_REACH, mode=Mode.PRIVATE) & part.part
    # Эскиз36 → Вырез-Вытянуть5 (cut, up to next)
    with BuildSketch(Plane(origin=(0, 13.8, 0), x_dir=(1, 0, 0), z_dir=(0, 1, 0)), mode=Mode.PRIVATE) as cut_extrude_5_sk3:
        with Locations(Location((8, 6.5317, 0), (0, 0, 90))):
            Circle(SKETCH_36_R)
    cut_extrude_5_tool3 = extrude(cut_extrude_5_sk3.sketch, amount=-CUT_EXTRUDE_5_REACH, mode=Mode.PRIVATE) & part.part
    # Эскиз36 → Вырез-Вытянуть5 (cut, up to next)
    with BuildSketch(Plane(origin=(0, 13.8, 0), x_dir=(1, 0, 0), z_dir=(0, 1, 0)), mode=Mode.PRIVATE) as cut_extrude_5_sk4:
        with Locations(Location((32, 6.5317, 0), (0, 0, 90))):
            Circle(SKETCH_36_R)
    cut_extrude_5_tool4 = extrude(cut_extrude_5_sk4.sketch, amount=-CUT_EXTRUDE_5_REACH, mode=Mode.PRIVATE) & part.part
    add(cut_extrude_5_tool1.solids().sort_by_distance((8, 13.8, -118.4683))[0], mode=Mode.SUBTRACT)
    add(cut_extrude_5_tool2.solids().sort_by_distance((32, 13.8, -118.4683))[0], mode=Mode.SUBTRACT)
    add(cut_extrude_5_tool3.solids().sort_by_distance((8, 13.8, -6.5317))[0], mode=Mode.SUBTRACT)
    add(cut_extrude_5_tool4.solids().sort_by_distance((32, 13.8, -6.5317))[0], mode=Mode.SUBTRACT)


solid = part.part
